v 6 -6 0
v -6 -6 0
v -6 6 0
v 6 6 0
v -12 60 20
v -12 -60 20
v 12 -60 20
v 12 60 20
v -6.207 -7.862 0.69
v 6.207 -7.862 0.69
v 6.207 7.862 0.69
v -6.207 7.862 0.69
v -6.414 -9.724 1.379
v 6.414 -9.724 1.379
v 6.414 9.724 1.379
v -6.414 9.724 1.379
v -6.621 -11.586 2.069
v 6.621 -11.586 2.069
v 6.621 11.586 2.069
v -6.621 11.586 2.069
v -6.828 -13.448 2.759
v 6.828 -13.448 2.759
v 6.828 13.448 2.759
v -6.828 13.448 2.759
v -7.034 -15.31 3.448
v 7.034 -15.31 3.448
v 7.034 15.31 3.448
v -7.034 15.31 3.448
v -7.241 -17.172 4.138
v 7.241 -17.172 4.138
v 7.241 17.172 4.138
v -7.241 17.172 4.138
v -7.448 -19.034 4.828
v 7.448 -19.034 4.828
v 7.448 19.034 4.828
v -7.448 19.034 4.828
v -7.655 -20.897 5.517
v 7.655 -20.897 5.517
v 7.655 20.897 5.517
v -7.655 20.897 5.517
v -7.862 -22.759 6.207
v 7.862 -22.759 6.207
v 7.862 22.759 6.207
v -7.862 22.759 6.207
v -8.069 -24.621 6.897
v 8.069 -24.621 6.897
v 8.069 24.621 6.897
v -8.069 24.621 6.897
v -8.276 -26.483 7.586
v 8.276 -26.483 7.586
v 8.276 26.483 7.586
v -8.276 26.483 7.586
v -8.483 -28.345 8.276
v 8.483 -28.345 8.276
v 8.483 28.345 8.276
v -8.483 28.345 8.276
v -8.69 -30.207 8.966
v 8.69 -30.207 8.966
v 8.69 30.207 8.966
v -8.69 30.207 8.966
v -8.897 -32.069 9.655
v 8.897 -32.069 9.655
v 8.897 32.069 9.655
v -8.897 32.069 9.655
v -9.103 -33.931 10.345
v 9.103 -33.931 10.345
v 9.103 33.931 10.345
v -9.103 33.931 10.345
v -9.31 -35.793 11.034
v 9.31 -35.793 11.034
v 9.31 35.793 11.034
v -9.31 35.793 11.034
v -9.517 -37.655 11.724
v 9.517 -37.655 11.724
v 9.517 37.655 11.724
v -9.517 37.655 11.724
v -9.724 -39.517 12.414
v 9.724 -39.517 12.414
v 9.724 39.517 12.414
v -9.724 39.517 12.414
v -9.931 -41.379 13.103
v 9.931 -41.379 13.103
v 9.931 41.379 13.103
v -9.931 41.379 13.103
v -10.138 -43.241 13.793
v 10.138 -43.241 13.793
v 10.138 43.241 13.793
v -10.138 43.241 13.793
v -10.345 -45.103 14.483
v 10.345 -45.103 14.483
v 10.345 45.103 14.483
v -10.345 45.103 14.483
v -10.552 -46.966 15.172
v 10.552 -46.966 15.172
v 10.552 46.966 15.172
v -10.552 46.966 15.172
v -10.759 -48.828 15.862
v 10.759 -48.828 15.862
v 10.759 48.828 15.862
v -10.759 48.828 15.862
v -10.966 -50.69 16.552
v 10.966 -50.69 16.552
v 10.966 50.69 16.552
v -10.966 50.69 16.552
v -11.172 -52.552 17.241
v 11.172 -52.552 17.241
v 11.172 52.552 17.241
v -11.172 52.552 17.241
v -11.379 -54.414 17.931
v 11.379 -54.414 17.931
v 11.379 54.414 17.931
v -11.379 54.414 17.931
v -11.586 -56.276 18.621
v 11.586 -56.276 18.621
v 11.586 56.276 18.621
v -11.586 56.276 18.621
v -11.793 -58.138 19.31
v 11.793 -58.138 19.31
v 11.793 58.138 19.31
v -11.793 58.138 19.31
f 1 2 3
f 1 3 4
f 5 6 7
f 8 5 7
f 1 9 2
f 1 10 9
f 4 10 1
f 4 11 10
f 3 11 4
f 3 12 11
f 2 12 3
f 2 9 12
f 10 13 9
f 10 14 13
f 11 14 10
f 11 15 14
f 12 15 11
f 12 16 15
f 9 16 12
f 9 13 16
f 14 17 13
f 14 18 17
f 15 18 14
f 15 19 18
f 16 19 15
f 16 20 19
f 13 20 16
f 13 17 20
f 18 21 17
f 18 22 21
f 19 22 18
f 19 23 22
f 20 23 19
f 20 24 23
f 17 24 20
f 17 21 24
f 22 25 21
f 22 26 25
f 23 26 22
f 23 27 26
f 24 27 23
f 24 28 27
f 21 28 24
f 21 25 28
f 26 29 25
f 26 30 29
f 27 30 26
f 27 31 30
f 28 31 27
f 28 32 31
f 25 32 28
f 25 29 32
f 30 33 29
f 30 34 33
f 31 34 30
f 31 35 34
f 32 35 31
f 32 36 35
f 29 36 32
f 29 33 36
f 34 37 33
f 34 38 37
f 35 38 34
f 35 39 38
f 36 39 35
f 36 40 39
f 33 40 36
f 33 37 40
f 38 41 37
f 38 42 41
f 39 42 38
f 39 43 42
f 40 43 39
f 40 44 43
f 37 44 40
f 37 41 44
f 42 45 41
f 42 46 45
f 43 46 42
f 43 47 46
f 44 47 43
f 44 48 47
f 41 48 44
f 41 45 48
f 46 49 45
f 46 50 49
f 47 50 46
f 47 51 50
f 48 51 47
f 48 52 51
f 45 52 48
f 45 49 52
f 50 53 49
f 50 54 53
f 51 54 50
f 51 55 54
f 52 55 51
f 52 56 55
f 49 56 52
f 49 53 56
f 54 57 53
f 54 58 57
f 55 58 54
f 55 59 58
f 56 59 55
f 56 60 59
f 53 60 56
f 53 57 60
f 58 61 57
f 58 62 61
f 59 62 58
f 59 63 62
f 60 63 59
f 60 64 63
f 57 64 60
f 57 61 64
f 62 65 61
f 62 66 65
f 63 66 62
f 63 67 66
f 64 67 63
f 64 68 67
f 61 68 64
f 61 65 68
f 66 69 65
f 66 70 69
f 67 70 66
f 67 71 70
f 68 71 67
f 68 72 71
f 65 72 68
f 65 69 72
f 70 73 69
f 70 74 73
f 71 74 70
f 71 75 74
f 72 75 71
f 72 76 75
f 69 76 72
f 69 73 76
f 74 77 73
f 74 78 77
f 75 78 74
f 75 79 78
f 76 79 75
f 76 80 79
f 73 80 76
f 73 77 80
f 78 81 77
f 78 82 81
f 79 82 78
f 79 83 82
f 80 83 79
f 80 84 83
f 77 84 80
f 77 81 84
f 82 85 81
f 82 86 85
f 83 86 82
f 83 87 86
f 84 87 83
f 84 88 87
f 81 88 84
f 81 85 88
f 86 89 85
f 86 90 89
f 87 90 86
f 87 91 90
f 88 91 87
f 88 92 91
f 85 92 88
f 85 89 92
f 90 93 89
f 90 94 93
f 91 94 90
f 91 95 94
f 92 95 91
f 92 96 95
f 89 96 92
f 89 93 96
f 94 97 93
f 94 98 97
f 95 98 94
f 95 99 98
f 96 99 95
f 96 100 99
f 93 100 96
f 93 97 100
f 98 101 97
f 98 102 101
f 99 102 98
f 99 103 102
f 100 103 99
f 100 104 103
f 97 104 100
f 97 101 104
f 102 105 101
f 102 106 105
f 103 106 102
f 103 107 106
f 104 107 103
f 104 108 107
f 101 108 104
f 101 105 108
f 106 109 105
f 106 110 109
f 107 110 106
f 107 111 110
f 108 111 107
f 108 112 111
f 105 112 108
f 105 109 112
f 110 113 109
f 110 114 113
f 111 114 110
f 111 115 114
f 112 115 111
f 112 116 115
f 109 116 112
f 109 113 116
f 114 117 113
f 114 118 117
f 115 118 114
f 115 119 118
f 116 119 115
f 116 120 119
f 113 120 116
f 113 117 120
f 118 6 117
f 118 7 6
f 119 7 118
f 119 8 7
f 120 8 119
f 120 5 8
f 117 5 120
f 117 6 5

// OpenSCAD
//linear_extrude(height=20,scale=0)
//    square(12,center=true);

//linear_extrude(height=20,scale=10)
//    square(12,center=true);

linear_extrude(height=20,scale=[2,10])
    square(12,center=true);
